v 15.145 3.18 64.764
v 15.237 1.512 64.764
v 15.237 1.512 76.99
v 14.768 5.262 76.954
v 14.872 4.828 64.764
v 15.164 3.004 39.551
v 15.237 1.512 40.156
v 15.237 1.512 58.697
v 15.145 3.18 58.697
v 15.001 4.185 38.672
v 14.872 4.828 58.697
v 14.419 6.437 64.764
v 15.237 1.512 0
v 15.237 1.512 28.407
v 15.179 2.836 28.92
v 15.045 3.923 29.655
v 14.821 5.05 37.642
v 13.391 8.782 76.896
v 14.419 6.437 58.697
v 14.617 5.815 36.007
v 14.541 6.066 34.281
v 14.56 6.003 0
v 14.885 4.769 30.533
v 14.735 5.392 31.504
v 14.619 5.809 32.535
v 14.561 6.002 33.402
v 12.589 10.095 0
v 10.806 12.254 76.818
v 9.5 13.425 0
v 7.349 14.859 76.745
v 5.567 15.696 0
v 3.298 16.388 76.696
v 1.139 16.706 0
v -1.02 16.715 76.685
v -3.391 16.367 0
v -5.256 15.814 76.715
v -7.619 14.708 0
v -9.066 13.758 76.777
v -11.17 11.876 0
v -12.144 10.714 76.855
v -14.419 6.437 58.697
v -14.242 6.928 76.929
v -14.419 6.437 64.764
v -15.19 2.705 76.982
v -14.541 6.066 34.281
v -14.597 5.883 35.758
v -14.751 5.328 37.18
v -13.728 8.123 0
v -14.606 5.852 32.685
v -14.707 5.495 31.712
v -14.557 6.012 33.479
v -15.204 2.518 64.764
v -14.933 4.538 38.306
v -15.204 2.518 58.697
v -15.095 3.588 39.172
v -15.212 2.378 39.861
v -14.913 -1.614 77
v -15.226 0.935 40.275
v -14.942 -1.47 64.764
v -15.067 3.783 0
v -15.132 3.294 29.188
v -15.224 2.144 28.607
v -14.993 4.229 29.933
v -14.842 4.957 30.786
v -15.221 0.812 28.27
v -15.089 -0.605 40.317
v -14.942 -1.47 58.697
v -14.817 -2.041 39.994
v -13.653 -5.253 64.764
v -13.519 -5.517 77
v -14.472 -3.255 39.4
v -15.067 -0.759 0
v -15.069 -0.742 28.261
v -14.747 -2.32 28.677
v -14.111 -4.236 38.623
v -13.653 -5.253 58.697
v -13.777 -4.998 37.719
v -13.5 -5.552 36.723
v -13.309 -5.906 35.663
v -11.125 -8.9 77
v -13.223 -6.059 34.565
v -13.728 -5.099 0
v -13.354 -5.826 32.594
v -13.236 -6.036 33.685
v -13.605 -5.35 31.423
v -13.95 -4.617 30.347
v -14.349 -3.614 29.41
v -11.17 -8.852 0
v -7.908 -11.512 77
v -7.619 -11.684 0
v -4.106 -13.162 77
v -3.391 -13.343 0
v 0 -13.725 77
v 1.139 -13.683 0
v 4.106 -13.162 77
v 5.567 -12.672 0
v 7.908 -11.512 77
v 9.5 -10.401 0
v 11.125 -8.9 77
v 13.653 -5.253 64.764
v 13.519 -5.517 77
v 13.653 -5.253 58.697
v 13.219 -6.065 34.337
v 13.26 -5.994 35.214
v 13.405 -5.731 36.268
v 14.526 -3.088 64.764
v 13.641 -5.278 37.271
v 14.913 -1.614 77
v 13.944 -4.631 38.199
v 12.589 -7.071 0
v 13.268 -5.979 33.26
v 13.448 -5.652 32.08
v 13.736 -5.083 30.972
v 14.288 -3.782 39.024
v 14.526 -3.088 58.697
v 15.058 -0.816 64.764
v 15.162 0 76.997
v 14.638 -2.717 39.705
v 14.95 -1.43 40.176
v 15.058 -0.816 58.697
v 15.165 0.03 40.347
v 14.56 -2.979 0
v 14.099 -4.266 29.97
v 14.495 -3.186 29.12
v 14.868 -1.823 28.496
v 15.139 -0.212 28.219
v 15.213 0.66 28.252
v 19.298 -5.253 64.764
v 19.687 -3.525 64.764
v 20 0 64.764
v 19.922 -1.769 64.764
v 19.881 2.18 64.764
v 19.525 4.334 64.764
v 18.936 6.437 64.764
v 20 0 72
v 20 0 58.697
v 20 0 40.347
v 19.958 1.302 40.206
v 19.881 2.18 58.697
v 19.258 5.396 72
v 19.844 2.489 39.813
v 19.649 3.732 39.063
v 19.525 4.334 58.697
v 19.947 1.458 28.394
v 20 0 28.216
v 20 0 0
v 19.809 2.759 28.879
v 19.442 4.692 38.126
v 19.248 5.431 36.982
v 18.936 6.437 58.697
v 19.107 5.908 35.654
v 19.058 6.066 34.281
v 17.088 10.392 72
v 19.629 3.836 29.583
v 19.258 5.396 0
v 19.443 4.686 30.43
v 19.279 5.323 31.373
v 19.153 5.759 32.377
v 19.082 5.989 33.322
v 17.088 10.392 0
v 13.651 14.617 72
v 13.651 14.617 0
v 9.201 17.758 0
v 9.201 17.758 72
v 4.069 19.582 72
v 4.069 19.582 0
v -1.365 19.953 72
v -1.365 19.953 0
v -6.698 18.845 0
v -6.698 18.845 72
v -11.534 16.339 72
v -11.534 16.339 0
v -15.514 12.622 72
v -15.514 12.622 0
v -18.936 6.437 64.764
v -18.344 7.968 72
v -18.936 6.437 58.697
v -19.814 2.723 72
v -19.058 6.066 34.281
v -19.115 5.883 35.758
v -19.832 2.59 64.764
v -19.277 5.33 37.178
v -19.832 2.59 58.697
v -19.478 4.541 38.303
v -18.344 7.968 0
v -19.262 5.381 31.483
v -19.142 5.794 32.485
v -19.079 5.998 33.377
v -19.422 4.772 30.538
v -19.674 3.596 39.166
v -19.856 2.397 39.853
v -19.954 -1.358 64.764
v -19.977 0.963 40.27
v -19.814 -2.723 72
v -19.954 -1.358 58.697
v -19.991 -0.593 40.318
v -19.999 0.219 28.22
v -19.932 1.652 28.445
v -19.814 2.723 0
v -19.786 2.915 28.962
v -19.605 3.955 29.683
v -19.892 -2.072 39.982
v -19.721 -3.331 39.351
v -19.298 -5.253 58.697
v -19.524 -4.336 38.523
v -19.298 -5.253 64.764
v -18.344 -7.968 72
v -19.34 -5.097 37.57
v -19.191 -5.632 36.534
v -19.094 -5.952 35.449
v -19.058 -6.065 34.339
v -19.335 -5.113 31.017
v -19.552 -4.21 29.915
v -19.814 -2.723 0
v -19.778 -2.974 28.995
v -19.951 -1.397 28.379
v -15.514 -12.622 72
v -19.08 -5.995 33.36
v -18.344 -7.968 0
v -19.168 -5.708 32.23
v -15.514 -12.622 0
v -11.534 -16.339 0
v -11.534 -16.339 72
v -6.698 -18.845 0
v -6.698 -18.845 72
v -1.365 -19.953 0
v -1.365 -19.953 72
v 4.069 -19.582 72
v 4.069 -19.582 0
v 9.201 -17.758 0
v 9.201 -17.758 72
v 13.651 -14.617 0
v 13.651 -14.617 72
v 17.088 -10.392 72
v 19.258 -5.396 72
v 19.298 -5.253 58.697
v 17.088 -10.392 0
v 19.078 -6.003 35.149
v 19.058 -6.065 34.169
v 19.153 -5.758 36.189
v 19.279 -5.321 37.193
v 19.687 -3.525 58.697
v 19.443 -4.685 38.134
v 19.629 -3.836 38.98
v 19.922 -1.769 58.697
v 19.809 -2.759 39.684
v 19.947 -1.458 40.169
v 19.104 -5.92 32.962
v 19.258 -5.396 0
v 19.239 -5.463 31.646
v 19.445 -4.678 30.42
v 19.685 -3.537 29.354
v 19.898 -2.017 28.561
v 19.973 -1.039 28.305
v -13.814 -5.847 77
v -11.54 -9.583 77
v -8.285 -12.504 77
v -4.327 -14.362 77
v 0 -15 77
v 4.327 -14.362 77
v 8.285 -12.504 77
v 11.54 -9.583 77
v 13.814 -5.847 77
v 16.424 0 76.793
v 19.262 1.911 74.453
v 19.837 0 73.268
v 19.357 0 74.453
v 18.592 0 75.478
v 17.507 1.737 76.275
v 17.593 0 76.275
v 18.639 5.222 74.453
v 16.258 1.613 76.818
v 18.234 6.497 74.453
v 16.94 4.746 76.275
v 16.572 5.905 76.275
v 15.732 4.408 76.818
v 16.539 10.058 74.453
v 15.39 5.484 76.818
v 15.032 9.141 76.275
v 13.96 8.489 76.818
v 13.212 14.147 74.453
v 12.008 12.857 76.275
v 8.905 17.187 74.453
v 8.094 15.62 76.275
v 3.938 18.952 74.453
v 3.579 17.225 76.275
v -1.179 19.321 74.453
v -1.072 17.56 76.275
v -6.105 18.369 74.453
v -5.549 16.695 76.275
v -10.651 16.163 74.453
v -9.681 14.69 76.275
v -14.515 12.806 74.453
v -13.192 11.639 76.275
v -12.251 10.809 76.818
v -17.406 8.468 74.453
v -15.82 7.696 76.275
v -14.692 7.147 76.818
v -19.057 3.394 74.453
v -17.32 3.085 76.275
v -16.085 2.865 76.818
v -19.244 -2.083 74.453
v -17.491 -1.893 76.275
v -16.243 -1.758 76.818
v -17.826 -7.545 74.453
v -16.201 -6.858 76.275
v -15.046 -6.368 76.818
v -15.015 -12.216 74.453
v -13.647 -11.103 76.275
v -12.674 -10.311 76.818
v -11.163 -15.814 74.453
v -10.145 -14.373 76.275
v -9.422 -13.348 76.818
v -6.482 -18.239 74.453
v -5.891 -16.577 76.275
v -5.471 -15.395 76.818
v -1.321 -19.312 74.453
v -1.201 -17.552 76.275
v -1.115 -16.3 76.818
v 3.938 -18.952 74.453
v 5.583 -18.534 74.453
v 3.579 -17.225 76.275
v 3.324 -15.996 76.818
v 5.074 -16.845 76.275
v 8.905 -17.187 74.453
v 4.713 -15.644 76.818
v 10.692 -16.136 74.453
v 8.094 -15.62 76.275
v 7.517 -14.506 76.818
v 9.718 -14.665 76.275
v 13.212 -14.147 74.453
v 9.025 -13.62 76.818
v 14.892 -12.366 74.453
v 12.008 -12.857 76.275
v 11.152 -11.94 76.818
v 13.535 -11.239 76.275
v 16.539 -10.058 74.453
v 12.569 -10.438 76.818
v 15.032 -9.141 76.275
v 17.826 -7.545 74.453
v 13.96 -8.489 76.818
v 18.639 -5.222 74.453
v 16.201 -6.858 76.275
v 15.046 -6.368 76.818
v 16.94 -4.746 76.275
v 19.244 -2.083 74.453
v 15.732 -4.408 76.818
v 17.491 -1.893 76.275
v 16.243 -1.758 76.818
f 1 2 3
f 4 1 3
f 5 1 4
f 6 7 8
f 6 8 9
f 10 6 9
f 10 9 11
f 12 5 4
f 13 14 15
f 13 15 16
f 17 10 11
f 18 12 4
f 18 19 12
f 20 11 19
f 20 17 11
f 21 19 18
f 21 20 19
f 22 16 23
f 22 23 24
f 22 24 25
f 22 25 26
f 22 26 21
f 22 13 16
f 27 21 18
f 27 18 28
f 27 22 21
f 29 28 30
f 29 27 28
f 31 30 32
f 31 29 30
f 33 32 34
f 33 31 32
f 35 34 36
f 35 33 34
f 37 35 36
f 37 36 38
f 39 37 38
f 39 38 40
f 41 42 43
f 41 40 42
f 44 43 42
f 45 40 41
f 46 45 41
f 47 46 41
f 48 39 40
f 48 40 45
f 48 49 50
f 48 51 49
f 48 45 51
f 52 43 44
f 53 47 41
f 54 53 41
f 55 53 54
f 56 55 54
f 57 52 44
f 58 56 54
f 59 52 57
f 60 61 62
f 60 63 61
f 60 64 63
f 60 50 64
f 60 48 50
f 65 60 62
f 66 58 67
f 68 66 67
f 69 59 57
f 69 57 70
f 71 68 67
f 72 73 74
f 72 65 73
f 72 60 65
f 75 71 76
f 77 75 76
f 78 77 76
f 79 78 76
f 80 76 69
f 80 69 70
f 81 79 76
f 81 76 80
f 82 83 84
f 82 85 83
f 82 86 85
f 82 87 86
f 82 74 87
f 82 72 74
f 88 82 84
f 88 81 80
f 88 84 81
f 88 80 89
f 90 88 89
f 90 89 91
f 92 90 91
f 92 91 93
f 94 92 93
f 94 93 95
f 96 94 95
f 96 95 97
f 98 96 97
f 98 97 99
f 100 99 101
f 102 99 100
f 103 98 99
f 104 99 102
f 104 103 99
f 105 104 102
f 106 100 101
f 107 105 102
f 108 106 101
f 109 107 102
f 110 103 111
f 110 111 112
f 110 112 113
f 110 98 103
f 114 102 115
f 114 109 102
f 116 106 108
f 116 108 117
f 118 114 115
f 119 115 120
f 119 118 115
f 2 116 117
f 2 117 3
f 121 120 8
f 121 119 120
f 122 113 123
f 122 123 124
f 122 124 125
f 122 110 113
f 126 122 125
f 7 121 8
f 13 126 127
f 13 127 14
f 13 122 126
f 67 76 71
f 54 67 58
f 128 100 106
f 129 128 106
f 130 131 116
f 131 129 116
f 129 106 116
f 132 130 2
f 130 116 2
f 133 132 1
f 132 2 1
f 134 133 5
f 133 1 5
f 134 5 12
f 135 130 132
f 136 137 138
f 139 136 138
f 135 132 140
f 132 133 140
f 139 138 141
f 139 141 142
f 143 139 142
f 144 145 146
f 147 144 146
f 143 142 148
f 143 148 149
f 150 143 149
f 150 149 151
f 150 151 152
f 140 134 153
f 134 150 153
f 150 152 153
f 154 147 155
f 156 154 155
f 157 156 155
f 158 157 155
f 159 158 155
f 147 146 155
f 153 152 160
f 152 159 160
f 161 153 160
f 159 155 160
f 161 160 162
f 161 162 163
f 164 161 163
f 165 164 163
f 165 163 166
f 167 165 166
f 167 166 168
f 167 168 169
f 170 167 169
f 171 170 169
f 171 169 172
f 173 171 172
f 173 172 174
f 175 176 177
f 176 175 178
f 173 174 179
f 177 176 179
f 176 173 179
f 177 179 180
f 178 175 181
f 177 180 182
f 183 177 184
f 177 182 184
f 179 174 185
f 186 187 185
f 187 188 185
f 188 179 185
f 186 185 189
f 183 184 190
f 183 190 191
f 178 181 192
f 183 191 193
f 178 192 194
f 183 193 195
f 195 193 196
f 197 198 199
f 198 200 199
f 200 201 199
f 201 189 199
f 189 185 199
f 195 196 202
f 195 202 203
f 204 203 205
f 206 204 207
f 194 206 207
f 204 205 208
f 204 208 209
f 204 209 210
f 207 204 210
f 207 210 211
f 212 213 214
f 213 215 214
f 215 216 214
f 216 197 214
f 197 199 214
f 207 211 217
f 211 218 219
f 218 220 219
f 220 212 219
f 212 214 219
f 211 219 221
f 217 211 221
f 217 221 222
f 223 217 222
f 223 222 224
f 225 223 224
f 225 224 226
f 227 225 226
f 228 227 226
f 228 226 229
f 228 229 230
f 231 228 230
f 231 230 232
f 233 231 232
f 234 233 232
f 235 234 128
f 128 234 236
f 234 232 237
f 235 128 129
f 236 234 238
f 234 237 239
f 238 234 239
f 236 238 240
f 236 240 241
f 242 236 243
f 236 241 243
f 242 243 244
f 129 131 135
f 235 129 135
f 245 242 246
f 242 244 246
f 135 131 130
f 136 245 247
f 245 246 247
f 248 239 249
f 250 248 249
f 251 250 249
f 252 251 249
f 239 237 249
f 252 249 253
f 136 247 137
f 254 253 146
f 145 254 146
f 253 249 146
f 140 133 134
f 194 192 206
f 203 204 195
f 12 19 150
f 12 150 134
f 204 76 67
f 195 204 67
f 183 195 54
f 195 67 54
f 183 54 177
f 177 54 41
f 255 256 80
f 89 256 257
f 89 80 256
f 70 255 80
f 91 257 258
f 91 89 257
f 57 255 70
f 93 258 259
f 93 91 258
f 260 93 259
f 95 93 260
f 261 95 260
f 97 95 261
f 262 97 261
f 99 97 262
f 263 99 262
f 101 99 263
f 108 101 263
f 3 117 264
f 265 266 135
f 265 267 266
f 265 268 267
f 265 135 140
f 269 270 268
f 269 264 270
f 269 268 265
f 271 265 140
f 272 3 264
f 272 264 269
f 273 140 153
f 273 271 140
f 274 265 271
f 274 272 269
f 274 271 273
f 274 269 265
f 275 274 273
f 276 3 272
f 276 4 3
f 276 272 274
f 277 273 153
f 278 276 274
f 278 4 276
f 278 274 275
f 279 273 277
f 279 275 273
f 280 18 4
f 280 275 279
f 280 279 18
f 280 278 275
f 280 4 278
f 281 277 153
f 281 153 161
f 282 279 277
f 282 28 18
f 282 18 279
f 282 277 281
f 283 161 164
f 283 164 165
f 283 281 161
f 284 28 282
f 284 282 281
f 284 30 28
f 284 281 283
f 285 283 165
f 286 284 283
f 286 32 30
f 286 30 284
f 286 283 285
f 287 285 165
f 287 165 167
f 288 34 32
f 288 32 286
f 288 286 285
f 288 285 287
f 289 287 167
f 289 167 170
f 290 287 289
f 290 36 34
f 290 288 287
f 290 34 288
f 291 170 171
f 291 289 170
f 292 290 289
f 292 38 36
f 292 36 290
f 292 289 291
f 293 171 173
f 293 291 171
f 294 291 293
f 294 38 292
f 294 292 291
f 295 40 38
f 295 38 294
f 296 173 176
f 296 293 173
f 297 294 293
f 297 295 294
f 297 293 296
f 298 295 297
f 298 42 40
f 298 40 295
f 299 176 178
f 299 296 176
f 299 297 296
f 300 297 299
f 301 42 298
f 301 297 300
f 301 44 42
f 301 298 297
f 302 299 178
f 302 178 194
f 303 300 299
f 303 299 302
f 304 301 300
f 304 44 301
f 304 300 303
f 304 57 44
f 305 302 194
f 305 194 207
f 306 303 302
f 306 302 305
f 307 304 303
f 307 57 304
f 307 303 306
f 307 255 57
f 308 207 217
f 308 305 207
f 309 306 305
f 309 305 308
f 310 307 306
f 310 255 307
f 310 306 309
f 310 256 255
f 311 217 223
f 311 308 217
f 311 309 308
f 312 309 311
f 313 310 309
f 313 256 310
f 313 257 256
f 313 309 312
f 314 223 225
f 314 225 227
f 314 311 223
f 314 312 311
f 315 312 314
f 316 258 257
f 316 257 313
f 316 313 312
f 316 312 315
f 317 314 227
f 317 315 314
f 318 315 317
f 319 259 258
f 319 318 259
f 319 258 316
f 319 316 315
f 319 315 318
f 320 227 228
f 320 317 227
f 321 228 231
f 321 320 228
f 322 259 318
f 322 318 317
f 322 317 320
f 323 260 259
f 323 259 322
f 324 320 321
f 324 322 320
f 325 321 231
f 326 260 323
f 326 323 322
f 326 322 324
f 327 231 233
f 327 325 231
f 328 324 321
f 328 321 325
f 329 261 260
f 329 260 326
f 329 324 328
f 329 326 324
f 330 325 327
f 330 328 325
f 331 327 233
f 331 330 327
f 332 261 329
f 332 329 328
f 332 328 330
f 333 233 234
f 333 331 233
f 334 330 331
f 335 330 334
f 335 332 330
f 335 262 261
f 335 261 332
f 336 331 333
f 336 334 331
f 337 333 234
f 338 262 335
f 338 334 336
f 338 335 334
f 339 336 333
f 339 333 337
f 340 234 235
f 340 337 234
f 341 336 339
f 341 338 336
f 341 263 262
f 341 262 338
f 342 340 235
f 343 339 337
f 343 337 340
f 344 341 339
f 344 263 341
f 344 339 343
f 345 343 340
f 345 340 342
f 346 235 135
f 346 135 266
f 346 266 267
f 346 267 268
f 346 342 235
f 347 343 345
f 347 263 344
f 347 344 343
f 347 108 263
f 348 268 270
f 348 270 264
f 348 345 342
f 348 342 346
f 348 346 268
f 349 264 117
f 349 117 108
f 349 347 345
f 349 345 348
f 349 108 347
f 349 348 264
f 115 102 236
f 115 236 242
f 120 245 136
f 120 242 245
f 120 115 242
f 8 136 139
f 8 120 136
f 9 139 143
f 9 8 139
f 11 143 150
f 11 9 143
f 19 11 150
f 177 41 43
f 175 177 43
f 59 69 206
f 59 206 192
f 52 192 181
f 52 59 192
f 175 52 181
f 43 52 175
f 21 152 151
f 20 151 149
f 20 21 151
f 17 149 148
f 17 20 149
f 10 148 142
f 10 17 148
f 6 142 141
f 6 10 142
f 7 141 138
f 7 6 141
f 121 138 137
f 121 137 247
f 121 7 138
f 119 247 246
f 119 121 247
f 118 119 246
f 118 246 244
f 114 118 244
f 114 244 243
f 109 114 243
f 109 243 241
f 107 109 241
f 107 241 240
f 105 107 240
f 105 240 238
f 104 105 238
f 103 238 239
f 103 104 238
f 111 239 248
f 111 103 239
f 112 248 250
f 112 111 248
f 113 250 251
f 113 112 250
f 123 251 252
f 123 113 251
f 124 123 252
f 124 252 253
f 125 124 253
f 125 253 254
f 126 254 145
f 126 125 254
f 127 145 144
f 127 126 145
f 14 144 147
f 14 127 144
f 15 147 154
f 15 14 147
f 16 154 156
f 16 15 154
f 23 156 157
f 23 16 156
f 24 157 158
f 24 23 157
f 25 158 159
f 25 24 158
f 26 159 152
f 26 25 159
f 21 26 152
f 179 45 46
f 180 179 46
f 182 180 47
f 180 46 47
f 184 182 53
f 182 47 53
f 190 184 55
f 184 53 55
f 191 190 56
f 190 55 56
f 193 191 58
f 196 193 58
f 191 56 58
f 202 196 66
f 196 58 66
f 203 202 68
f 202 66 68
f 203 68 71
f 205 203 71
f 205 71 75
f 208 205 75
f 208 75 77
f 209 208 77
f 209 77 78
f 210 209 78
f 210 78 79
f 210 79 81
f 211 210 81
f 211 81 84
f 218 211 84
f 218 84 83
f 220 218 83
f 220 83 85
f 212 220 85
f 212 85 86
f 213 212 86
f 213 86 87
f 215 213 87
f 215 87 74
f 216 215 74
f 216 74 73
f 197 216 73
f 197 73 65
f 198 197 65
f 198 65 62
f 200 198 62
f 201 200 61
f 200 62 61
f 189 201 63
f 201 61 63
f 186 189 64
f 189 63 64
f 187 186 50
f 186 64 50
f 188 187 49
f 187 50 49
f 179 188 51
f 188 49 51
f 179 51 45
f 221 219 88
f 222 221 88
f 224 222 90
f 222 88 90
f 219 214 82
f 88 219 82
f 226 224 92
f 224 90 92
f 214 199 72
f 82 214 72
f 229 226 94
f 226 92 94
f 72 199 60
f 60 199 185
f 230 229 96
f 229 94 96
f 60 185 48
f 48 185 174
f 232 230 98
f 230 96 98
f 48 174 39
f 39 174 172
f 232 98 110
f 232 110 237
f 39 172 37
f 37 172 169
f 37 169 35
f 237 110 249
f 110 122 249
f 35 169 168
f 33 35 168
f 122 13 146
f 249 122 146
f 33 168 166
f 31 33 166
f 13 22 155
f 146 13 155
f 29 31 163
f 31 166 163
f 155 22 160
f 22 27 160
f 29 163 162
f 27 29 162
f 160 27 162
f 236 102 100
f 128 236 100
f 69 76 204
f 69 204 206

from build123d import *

# Parameters (mm, degrees)
F0_R          = 20
F0_R_2        = 15.237
F1_DEPTH      = 77
F3_R          = 6.065714741
F4_DEPTH      = 25
F4_DEPTH_BACK = 25
F3_W          = 11.689950712
F3_H          = 6.0669332743
F5_DEPTH      = 25
F5_DEPTH_BACK = 25


# Not quite as in the source:
# - a fillet or chamfer that OpenCascade refuses, or shapes differently, is made with other operations: its cross-section is extruded or revolved along the edge and cut away or added


with BuildPart() as f1:
    # F0 (on Top) → F1 (new body)
    with BuildSketch(Plane.XY):
        Circle(F0_R)
        with Locations((0, 1.5118854353)):
            Circle(F0_R_2, mode=Mode.SUBTRACT)
    extrude(amount=F1_DEPTH)

    # F2: fillet of radius 5 on 1 edges, made by hand

    # F2_s1 → F2_t2 (revolve, cut)
    with BuildSketch(Plane.XZ):
        with BuildLine():
            ThreePointArc((20, 72), (18.5355339059, 75.5355339059), (15, 77))
            Line((15, 77), (20, 77))
            Line((20, 77), (20, 72))
        make_face()
    revolve(axis=Axis((0, 0, 77), (0, 0, 1)), mode=Mode.SUBTRACT)

    # F3 (on Right) → F4 (join, two sides)
    with BuildSketch(Plane.YZ) as f4_sk:
        with Locations((0, 34.2814810574)):
            Circle(F3_R)
    extrude(amount=F4_DEPTH)
    extrude(f4_sk.sketch, amount=-F4_DEPTH_BACK)

    # F3 (on Right) → F5 (cut, two sides)
    with BuildSketch(Plane.YZ) as f5_sk:
        with Locations((0, 34.2814810574)):
            Circle(F3_R)
        with Locations((0.5918950774, 61.7306679487)):
            Rectangle(F3_W, F3_H)
    extrude(amount=-F5_DEPTH, mode=Mode.SUBTRACT)
    extrude(f5_sk.sketch, amount=F5_DEPTH_BACK, mode=Mode.SUBTRACT)


solid = f1.part
